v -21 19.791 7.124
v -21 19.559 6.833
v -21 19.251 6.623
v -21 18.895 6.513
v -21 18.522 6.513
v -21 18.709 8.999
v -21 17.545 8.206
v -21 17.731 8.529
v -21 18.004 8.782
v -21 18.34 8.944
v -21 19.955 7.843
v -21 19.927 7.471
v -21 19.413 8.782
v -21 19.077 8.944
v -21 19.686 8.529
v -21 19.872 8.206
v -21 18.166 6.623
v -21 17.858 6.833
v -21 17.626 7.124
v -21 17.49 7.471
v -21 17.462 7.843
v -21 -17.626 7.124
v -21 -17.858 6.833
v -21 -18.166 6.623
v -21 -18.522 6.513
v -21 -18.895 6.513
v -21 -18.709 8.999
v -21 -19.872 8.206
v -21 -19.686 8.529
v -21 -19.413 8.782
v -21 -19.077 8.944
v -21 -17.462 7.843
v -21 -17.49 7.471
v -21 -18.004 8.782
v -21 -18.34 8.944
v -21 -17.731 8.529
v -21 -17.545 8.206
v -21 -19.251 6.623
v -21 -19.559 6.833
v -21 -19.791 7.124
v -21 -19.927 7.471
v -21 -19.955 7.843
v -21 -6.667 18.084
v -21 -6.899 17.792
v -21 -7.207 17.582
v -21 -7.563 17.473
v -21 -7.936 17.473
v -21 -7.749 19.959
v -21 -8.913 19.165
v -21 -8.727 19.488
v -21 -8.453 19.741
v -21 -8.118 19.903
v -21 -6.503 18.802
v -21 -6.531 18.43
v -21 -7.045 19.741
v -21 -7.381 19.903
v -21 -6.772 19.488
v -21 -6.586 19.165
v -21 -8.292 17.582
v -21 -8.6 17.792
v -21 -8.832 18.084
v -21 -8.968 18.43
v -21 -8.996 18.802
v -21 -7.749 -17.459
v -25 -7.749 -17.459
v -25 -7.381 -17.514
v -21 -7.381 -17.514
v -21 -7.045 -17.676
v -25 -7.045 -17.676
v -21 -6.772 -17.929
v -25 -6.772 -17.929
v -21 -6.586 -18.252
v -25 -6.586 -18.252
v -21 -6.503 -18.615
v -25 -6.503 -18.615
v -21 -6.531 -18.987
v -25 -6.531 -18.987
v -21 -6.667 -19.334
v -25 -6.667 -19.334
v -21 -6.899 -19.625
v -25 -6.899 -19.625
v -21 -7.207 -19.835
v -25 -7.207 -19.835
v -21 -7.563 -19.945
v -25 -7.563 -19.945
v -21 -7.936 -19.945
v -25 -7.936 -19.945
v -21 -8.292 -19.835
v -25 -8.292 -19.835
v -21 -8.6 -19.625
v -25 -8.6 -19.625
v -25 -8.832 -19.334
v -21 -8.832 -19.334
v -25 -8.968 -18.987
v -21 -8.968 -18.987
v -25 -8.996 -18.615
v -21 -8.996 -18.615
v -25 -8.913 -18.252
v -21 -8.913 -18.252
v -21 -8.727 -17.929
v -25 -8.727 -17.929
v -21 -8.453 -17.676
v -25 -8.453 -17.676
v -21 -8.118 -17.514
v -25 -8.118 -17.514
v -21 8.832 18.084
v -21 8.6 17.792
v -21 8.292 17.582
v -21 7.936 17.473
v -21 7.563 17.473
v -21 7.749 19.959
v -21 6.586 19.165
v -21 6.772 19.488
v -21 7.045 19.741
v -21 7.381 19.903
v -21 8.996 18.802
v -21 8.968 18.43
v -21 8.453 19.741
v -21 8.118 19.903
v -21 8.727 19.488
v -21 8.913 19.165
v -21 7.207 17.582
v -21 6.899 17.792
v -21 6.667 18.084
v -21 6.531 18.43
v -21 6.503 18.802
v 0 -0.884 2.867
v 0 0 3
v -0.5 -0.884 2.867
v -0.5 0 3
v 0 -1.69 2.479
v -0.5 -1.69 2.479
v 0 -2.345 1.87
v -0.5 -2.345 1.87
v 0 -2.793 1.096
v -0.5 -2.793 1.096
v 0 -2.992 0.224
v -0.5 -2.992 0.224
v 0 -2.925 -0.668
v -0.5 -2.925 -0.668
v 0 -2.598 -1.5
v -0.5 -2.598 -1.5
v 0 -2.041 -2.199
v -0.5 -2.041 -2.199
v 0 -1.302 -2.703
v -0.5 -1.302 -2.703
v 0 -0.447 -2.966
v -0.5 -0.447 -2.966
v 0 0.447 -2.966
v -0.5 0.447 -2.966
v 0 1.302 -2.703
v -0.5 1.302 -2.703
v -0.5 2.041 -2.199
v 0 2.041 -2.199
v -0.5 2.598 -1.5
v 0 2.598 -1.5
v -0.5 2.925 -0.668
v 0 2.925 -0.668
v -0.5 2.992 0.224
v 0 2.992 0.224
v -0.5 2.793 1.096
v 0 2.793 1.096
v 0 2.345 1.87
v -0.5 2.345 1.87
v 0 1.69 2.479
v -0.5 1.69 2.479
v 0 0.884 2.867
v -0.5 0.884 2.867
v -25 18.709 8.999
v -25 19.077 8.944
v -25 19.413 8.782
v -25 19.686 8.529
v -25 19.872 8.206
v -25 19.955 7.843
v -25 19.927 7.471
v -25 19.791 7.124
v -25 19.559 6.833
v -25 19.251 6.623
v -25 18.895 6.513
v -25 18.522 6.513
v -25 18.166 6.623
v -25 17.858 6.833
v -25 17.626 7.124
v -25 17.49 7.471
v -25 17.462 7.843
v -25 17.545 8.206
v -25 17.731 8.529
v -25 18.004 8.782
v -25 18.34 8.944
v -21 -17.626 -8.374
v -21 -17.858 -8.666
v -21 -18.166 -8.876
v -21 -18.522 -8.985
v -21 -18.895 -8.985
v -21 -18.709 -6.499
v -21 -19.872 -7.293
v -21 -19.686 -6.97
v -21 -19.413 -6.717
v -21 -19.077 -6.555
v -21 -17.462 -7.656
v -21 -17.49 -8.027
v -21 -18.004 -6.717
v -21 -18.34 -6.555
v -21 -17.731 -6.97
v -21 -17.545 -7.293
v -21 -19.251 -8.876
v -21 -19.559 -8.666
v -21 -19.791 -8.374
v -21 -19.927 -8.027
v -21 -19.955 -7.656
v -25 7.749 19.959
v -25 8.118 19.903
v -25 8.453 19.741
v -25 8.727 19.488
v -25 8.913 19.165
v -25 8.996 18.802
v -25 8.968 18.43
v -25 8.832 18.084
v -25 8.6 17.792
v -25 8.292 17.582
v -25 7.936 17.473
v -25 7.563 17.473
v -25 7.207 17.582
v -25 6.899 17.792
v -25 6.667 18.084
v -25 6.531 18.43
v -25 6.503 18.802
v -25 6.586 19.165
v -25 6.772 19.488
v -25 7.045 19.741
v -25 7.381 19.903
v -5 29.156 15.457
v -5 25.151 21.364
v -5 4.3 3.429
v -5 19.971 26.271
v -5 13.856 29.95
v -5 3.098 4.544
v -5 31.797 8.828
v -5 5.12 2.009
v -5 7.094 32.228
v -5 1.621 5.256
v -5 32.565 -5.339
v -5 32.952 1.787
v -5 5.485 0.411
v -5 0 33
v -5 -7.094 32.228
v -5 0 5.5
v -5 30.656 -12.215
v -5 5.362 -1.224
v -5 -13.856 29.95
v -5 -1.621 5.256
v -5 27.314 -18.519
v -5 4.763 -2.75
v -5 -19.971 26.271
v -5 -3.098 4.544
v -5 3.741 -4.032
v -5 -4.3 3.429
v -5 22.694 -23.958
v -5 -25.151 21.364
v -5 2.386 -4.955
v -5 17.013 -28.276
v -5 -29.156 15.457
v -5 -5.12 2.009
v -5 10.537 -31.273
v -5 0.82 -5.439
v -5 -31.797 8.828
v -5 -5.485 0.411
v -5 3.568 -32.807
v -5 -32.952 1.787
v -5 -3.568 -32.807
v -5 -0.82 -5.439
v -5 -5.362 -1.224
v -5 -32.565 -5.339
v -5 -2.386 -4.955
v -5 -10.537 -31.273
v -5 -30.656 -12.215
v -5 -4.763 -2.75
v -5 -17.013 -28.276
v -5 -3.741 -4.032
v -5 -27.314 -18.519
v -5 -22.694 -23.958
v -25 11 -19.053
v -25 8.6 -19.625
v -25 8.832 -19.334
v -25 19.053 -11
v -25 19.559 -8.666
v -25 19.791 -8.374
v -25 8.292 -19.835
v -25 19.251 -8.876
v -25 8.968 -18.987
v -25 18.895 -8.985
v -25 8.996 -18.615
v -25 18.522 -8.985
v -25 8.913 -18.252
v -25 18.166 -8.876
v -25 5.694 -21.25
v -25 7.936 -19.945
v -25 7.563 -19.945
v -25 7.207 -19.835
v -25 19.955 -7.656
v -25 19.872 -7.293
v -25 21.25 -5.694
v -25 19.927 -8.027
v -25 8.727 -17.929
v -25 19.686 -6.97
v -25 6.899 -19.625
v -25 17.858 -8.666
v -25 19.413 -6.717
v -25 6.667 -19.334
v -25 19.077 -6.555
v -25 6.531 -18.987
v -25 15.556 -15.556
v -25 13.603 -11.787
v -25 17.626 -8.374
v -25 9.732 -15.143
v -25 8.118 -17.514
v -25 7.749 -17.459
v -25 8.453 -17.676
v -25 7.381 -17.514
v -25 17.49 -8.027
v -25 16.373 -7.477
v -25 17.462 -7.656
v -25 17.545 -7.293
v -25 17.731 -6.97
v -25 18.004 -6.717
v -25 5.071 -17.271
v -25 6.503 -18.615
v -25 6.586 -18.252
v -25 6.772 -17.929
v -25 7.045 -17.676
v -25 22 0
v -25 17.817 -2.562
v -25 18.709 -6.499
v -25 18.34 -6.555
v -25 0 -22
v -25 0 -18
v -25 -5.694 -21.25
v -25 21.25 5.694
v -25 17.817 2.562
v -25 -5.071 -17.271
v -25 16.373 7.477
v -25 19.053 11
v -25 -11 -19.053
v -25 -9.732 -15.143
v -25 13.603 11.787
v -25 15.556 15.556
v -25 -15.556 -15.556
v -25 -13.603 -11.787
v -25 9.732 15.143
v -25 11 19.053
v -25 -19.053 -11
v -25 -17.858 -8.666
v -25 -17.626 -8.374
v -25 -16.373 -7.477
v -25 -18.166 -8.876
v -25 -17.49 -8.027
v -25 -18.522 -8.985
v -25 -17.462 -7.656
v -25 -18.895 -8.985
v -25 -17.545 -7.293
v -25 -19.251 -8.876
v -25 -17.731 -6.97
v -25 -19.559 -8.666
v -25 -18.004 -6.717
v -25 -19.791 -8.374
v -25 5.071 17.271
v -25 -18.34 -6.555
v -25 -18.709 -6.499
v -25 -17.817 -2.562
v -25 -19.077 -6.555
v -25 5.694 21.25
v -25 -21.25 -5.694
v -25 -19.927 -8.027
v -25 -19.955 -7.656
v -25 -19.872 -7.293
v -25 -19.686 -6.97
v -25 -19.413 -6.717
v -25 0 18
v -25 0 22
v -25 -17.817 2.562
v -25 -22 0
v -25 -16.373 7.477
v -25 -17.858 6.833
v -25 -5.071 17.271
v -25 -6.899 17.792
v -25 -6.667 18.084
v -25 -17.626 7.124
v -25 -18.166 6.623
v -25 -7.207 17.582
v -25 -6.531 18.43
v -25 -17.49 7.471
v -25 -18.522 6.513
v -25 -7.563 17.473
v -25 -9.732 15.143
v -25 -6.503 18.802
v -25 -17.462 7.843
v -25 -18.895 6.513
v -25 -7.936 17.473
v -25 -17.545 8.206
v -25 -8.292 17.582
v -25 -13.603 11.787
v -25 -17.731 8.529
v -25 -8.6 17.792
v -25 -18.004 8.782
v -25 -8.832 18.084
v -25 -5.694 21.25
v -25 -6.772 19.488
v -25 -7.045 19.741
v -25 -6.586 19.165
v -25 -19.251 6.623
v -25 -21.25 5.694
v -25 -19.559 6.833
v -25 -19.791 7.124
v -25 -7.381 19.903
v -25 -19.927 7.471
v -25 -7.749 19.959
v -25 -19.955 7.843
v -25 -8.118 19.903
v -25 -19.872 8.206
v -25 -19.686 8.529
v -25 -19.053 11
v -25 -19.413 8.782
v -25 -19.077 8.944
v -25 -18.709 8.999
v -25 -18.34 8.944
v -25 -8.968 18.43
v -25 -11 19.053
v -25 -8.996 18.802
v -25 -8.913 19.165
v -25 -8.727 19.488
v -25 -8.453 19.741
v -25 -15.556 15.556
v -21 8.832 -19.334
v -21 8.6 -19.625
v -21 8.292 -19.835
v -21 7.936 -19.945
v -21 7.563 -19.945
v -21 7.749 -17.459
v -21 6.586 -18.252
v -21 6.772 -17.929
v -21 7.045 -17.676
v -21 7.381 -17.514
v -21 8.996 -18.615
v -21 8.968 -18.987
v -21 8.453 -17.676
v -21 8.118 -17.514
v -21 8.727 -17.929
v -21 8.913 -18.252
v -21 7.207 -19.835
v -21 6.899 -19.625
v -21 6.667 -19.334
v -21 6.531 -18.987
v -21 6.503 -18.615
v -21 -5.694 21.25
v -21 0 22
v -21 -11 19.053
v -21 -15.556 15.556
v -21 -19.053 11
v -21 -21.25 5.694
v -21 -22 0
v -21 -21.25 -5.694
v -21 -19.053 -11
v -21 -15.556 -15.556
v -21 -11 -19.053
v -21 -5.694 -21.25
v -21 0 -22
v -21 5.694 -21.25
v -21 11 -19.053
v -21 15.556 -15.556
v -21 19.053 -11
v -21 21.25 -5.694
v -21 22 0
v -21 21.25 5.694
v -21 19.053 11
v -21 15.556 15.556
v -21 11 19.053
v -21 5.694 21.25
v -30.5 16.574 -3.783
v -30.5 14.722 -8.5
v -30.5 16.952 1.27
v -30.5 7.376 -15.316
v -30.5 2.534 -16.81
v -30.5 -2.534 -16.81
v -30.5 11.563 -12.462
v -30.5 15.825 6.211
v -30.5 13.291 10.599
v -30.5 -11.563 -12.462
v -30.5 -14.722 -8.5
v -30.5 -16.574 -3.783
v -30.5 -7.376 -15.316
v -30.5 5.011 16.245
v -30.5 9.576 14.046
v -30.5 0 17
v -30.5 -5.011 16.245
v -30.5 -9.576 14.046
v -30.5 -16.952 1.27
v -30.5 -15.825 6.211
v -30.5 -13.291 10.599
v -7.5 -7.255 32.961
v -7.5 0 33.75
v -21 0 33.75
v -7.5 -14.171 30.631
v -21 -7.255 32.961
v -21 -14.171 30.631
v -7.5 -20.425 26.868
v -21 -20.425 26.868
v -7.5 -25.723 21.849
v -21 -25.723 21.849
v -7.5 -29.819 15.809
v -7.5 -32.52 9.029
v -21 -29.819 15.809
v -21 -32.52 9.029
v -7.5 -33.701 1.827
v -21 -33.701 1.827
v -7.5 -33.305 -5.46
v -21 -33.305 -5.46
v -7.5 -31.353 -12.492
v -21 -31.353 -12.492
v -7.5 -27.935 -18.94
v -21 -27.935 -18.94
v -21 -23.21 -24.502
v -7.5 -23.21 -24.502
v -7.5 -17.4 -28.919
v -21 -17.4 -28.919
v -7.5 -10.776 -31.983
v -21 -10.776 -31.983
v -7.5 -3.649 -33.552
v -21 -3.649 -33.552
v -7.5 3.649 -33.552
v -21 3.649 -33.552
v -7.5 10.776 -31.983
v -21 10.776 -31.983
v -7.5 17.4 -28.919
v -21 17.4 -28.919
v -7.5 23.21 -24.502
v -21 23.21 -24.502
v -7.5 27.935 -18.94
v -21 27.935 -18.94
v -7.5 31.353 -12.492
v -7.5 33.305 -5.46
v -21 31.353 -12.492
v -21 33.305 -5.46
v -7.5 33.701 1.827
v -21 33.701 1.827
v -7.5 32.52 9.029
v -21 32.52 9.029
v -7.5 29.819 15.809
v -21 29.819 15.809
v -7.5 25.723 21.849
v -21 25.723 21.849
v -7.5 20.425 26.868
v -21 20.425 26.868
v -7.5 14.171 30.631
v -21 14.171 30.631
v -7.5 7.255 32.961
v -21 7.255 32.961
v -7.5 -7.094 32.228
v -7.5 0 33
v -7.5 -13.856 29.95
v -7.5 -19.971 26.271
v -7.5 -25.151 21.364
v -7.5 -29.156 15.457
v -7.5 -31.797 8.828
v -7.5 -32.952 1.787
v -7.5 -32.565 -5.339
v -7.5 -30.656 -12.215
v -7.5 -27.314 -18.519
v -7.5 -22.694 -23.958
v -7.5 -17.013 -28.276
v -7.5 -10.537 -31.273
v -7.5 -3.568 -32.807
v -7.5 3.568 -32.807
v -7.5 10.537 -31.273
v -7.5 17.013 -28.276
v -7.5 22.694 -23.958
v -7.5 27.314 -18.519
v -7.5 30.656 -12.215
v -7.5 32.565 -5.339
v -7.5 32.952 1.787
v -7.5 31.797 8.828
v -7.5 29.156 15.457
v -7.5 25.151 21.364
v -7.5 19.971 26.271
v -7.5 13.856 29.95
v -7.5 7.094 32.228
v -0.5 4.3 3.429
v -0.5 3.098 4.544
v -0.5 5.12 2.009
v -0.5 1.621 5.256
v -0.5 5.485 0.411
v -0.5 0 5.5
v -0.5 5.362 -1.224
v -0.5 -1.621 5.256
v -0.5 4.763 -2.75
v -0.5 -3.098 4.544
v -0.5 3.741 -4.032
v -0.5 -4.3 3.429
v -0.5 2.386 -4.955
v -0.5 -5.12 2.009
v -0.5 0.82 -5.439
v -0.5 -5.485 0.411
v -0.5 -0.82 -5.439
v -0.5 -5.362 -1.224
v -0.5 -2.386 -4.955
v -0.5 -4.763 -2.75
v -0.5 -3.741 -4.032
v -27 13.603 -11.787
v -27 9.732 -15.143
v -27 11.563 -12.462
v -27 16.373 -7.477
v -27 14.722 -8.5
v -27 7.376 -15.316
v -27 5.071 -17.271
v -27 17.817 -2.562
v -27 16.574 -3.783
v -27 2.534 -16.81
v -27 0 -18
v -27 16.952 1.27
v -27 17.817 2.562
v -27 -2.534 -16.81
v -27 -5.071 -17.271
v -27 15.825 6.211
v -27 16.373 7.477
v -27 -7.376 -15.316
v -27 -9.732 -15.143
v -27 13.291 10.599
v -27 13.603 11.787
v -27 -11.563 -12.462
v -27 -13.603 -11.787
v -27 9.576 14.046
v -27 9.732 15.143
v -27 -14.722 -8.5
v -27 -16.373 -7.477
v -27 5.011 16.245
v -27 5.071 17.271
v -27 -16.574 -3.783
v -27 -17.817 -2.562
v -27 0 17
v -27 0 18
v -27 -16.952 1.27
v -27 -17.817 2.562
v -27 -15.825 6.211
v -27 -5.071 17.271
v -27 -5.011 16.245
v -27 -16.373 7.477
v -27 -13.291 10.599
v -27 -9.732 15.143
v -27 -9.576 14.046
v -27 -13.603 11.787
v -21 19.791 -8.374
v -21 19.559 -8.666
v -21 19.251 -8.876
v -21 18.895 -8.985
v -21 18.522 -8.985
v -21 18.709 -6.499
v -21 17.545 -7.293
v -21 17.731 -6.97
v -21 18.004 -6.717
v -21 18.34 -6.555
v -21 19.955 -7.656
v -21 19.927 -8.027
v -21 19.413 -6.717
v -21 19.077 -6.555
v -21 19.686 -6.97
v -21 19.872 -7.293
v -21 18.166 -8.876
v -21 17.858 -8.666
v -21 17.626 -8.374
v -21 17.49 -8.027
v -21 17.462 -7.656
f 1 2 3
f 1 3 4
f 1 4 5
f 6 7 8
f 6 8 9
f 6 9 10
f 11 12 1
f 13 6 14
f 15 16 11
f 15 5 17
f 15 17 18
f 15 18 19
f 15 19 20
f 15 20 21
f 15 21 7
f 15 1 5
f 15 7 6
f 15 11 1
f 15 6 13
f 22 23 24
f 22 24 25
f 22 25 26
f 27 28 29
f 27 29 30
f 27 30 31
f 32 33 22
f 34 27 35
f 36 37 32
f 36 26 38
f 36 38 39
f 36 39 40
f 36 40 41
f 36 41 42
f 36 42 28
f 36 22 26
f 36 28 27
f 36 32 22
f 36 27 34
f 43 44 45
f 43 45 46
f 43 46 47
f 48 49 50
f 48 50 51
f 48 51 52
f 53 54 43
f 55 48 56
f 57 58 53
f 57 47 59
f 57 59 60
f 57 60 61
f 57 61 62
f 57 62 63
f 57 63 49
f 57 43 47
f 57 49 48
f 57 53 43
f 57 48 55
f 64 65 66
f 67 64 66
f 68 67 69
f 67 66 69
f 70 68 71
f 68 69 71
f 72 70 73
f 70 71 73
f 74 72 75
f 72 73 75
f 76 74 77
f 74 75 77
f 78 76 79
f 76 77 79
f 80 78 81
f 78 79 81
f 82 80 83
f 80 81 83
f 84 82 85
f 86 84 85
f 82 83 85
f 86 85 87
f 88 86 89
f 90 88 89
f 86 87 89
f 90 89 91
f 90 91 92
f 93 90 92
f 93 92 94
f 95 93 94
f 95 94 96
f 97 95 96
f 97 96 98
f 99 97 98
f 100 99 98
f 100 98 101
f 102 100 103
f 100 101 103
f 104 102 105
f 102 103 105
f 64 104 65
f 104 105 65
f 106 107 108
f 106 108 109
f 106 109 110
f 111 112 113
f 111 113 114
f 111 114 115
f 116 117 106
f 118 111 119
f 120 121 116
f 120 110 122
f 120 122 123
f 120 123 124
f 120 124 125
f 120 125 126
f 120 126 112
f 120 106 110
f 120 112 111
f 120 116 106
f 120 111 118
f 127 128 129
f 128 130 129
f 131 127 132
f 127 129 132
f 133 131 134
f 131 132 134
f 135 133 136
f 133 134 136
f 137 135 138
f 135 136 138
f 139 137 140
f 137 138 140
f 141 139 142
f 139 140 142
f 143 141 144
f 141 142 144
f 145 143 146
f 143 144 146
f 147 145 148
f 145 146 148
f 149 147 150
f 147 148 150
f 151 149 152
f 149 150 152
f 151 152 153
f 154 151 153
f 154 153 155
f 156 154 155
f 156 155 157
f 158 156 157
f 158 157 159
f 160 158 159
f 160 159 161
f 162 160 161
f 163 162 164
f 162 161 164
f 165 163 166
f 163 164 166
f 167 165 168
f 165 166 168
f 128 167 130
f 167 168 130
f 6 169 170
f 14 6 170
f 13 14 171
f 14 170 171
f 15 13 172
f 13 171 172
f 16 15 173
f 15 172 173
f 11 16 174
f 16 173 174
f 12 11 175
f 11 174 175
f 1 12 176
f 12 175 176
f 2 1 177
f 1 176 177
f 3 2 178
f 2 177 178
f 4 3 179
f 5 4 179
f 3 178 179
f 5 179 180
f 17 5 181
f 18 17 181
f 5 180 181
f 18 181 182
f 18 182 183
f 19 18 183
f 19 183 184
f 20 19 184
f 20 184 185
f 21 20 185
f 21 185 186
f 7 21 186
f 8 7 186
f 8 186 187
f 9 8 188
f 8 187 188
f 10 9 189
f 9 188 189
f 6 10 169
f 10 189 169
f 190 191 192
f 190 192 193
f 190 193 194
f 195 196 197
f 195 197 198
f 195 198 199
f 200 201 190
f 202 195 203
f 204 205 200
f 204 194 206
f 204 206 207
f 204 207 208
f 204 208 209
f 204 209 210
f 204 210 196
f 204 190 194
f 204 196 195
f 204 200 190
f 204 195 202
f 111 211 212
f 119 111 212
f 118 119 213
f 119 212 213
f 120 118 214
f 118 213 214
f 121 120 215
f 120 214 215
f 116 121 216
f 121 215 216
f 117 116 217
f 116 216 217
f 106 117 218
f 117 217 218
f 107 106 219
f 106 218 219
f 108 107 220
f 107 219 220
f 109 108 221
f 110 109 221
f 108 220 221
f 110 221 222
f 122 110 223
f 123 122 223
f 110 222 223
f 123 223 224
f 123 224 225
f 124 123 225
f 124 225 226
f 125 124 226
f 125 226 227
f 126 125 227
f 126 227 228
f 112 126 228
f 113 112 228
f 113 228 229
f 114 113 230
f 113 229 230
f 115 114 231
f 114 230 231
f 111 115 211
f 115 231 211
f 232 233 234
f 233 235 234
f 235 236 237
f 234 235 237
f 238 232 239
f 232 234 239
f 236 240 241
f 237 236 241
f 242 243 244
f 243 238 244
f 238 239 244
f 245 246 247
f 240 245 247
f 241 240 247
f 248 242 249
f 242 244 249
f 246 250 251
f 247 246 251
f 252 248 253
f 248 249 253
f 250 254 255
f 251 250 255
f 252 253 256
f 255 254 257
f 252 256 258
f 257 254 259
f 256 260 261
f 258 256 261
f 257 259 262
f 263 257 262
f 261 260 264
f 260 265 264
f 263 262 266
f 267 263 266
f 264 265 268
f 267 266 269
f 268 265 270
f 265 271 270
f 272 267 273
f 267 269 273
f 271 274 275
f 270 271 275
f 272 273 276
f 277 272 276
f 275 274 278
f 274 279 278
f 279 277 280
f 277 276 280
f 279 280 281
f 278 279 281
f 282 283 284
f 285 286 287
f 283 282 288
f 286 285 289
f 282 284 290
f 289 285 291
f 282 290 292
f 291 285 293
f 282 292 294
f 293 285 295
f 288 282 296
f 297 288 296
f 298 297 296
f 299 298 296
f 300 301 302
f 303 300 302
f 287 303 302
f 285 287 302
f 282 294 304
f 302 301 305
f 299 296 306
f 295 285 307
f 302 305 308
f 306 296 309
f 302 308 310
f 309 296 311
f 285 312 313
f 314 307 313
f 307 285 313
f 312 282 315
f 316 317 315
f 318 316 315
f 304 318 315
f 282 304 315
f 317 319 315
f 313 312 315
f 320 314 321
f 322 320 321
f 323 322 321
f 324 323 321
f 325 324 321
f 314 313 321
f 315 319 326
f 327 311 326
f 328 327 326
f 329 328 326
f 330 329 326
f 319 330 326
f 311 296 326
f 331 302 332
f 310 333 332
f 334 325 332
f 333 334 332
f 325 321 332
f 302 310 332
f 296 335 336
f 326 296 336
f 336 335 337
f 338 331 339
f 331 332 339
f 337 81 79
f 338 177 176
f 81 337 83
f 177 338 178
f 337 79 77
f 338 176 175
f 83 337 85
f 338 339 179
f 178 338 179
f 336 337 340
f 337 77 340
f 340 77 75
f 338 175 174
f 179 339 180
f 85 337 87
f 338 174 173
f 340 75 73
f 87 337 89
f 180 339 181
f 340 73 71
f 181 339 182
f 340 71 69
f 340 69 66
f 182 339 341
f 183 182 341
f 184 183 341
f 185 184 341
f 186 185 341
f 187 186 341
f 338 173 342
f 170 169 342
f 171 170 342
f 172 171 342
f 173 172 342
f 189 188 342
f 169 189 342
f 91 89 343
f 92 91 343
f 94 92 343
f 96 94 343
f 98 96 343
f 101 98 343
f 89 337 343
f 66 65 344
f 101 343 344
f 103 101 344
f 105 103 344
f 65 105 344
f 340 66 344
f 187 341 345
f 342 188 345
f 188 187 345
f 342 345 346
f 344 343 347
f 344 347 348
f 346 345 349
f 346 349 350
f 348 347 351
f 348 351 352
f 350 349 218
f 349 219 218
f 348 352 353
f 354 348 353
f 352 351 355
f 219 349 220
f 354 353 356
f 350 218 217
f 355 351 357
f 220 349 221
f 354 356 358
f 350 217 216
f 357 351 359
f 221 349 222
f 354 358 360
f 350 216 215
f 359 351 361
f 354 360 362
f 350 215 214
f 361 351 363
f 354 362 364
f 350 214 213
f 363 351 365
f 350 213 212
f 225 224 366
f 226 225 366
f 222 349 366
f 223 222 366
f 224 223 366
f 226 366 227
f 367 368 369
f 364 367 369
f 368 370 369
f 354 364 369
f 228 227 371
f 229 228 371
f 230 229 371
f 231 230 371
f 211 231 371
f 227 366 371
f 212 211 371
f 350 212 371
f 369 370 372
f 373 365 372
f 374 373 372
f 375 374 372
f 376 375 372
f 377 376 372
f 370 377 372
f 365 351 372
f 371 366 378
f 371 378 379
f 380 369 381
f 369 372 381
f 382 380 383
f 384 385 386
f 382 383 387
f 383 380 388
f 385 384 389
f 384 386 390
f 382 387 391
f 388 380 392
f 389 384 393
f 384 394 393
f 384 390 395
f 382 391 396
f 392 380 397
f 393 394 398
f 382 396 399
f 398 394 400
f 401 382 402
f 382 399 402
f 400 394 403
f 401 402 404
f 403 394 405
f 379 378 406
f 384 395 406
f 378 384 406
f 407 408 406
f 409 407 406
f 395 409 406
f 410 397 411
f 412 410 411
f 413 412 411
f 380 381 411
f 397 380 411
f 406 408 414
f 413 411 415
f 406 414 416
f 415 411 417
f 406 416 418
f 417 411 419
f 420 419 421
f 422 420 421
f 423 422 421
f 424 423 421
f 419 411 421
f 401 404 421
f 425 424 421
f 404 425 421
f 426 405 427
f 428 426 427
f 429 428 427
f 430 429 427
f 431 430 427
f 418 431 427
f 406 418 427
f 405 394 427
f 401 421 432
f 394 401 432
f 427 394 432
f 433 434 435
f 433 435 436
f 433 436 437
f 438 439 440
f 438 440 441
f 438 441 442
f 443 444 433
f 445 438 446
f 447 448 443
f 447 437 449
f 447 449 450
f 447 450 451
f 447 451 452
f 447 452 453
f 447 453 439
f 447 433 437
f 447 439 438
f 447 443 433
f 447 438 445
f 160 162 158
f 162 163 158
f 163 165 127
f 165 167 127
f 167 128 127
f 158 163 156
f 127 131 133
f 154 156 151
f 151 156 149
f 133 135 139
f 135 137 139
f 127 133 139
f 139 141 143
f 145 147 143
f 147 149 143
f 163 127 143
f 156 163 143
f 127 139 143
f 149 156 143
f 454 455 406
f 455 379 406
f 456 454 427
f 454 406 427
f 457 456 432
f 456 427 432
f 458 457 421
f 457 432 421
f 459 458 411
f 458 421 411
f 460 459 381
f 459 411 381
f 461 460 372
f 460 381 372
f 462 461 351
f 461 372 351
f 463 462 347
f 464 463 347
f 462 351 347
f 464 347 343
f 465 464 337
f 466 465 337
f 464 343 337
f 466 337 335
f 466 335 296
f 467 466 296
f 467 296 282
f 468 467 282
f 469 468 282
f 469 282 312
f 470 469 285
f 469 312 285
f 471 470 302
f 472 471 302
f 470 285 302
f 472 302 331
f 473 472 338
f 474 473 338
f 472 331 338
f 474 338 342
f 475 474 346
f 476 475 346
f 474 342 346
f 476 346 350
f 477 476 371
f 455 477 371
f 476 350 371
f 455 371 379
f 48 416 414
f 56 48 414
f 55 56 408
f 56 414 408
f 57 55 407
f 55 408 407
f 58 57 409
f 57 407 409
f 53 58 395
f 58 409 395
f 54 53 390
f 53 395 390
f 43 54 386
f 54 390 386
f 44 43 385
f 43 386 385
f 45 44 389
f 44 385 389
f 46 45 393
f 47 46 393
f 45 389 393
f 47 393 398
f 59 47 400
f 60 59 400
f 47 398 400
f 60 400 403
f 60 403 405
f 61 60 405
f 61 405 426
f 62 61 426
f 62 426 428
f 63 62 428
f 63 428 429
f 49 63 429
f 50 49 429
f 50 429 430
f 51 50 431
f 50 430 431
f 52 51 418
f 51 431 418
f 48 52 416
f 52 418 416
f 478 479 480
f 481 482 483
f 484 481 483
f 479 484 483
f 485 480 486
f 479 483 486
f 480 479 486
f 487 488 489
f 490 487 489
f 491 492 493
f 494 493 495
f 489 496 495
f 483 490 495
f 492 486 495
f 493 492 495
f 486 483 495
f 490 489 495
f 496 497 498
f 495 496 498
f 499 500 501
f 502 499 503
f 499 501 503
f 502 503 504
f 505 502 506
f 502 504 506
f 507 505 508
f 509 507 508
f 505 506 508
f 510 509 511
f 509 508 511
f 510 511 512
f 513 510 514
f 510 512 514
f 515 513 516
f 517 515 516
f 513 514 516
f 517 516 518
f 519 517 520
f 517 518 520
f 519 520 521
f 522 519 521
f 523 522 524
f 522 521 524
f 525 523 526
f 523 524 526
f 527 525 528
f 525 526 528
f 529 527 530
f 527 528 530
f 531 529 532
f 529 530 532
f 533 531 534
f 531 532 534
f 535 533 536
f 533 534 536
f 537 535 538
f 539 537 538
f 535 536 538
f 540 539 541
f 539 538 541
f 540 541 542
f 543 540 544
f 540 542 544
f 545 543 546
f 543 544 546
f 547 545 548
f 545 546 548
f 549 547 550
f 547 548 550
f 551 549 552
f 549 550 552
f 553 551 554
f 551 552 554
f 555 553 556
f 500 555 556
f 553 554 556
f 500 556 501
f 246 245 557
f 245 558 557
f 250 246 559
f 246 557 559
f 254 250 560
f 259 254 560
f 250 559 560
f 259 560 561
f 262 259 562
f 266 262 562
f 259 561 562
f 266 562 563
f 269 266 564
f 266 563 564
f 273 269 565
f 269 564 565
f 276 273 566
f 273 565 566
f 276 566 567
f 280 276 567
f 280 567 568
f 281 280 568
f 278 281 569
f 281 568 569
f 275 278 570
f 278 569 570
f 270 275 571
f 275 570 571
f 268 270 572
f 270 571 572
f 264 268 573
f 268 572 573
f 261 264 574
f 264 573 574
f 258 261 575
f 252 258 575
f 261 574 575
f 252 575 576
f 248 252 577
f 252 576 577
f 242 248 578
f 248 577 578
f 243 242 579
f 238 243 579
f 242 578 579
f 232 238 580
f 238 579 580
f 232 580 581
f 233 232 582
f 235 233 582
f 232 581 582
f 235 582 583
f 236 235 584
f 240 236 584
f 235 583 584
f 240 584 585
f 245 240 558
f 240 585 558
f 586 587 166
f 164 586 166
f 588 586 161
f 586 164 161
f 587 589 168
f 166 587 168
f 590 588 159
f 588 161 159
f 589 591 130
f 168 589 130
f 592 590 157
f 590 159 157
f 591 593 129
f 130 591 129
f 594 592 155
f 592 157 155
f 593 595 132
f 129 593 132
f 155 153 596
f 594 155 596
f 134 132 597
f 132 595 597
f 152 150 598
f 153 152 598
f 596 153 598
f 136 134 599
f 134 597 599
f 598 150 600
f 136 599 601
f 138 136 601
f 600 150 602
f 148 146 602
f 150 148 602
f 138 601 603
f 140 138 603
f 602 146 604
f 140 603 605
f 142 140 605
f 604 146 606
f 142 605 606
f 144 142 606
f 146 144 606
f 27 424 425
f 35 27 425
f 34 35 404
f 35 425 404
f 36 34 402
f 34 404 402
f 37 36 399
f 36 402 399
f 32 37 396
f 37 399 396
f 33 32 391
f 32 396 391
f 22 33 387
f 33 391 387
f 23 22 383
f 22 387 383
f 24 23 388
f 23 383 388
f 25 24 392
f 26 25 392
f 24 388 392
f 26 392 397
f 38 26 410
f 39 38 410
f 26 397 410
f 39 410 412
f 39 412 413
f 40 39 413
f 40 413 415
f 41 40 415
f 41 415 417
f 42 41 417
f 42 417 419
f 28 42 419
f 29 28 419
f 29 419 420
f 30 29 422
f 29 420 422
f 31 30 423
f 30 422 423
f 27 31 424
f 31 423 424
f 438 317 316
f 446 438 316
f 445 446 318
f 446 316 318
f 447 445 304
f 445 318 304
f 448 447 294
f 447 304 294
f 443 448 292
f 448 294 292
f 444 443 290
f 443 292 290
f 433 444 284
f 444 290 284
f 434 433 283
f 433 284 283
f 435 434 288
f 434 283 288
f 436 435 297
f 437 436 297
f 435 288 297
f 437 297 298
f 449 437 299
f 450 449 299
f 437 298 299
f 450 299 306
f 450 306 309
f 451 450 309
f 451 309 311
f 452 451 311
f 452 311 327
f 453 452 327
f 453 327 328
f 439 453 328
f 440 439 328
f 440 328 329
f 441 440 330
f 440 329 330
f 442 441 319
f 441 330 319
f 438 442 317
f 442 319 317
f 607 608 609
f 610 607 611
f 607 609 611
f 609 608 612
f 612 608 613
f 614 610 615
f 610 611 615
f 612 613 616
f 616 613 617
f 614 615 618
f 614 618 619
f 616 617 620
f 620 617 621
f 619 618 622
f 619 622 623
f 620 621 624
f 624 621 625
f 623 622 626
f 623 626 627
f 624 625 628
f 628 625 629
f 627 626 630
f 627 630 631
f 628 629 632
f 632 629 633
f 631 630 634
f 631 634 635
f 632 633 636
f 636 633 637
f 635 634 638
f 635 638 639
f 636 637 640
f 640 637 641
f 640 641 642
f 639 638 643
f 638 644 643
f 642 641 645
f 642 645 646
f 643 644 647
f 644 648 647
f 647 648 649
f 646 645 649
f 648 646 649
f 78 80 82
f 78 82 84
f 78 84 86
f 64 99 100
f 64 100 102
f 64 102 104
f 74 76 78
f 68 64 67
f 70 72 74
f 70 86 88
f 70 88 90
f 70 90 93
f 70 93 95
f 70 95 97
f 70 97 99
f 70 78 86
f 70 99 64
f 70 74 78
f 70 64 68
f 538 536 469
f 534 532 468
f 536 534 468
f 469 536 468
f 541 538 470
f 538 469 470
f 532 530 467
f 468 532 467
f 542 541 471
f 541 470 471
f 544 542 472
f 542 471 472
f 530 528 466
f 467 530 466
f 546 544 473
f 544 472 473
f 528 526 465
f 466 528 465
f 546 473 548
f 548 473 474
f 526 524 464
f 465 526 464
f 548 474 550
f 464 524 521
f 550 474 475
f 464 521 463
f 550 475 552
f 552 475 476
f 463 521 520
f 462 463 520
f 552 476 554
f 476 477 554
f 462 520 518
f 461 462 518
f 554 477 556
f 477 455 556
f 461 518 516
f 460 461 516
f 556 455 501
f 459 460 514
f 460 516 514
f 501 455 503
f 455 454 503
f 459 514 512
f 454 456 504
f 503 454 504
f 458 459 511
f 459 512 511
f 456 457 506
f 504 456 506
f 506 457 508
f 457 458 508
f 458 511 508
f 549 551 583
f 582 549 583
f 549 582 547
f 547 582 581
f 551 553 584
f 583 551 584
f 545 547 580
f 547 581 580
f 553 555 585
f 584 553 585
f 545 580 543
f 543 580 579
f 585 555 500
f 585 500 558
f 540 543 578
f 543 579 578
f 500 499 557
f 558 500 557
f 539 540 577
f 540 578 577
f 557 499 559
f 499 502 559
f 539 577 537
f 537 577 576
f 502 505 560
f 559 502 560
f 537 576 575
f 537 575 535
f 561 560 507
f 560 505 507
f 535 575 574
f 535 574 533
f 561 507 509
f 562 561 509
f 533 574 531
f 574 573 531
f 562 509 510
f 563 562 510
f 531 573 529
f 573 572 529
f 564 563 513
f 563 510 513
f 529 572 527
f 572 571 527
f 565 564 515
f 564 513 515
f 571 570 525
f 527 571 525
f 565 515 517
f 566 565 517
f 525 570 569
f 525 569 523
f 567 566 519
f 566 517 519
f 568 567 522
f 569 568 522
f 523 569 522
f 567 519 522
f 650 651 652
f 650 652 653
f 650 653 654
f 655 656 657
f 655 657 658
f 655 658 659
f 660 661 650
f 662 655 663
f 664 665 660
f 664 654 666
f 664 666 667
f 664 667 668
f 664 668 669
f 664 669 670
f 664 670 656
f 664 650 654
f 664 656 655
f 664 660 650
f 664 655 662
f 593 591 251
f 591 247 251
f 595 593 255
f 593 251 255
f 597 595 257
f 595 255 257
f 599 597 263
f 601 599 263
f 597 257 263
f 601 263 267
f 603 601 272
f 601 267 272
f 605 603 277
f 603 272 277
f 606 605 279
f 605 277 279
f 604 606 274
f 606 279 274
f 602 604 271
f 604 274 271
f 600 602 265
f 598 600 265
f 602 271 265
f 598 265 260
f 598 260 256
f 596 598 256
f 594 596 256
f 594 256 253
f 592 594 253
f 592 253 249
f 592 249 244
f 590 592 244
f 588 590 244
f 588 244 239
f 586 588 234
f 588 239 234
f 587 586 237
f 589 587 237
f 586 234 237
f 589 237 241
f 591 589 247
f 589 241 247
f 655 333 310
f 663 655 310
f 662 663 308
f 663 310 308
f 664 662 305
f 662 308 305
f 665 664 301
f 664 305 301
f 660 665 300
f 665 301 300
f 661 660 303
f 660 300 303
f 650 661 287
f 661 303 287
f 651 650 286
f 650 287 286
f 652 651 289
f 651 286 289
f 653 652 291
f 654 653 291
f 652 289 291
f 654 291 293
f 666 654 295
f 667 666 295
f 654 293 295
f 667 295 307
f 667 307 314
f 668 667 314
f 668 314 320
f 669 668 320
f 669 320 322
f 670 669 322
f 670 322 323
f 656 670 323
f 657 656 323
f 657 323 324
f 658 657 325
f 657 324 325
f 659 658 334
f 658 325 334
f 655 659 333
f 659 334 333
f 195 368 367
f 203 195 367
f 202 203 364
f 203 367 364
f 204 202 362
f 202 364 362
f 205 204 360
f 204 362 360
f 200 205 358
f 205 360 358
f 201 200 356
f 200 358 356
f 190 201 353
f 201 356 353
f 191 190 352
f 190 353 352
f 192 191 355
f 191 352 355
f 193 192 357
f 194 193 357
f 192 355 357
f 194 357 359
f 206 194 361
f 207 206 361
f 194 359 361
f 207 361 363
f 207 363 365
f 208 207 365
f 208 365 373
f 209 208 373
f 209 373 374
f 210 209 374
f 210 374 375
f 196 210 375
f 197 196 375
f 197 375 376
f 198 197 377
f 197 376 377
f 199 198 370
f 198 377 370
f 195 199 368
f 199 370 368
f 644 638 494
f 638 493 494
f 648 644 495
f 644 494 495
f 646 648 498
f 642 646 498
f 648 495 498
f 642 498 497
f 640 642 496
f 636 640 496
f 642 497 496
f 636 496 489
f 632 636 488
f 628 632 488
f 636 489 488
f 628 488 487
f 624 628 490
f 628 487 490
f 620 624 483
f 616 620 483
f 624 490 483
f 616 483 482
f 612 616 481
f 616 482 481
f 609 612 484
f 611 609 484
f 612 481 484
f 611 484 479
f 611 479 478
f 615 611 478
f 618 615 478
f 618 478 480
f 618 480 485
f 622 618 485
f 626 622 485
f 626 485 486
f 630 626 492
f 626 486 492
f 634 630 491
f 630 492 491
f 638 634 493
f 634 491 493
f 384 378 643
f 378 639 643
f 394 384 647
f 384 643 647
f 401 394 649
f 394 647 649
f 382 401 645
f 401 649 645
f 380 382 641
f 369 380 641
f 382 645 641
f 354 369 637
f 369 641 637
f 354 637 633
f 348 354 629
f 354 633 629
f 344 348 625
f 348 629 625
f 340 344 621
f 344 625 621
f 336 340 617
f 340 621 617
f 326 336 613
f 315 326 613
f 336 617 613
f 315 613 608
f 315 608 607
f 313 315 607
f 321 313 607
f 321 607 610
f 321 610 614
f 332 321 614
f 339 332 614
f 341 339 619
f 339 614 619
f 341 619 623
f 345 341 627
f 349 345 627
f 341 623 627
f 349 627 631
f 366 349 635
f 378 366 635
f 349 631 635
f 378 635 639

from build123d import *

# Parameters (mm, degrees)
SKETCH2_R          = 1.25
CUT_EXTRUDE1_DEPTH = 4


with BuildPart() as part:
    # Sketch1 → Revolve1 (revolve)
    with BuildSketch(Plane.XY, mode=Mode.PRIVATE) as revolve1_sk:
        Polygon((0, 0), (0, 3), (-0.5, 3), (-0.5, 5.5), (-5, 5.5), (-5, 33), (-7.5, 33), (-7.5, 33.75), (-21, 33.75), (-21, 22), (-25, 22), (-25, 18), (-27, 18), (-27, 17), (-30.5, 17), (-30.5, 0), align=None)
    revolve(revolve1_sk.sketch.rotate(Axis((-34.008884984, 0, 0), (1, 0, 0)), 90), axis=Axis((-34.008884984, 0, 0), (1, 0, 0)))

    # Sketch2 → Cut-Extrude1 (cut)
    with BuildSketch(Plane.ZY.offset(25)):
        with Locations((-7.749339505, 18.708560533)):
            Circle(SKETCH2_R)
        with Locations((7.749339505, 18.708560533)):
            Circle(SKETCH2_R)
        with Locations((18.708560533, 7.749339505)):
            Circle(SKETCH2_R)
        with Locations((18.708560533, -7.749339505)):
            Circle(SKETCH2_R)
        with Locations((7.749339505, -18.708560533)):
            Circle(SKETCH2_R)
        with Locations((-7.749339505, -18.708560533)):
            Circle(SKETCH2_R)
        with Locations((-18.708560533, -7.749339505)):
            Circle(SKETCH2_R)
        with Locations((-18.708560533, 7.749339505)):
            Circle(SKETCH2_R)
    extrude(amount=-CUT_EXTRUDE1_DEPTH, mode=Mode.SUBTRACT)


solid = part.part
